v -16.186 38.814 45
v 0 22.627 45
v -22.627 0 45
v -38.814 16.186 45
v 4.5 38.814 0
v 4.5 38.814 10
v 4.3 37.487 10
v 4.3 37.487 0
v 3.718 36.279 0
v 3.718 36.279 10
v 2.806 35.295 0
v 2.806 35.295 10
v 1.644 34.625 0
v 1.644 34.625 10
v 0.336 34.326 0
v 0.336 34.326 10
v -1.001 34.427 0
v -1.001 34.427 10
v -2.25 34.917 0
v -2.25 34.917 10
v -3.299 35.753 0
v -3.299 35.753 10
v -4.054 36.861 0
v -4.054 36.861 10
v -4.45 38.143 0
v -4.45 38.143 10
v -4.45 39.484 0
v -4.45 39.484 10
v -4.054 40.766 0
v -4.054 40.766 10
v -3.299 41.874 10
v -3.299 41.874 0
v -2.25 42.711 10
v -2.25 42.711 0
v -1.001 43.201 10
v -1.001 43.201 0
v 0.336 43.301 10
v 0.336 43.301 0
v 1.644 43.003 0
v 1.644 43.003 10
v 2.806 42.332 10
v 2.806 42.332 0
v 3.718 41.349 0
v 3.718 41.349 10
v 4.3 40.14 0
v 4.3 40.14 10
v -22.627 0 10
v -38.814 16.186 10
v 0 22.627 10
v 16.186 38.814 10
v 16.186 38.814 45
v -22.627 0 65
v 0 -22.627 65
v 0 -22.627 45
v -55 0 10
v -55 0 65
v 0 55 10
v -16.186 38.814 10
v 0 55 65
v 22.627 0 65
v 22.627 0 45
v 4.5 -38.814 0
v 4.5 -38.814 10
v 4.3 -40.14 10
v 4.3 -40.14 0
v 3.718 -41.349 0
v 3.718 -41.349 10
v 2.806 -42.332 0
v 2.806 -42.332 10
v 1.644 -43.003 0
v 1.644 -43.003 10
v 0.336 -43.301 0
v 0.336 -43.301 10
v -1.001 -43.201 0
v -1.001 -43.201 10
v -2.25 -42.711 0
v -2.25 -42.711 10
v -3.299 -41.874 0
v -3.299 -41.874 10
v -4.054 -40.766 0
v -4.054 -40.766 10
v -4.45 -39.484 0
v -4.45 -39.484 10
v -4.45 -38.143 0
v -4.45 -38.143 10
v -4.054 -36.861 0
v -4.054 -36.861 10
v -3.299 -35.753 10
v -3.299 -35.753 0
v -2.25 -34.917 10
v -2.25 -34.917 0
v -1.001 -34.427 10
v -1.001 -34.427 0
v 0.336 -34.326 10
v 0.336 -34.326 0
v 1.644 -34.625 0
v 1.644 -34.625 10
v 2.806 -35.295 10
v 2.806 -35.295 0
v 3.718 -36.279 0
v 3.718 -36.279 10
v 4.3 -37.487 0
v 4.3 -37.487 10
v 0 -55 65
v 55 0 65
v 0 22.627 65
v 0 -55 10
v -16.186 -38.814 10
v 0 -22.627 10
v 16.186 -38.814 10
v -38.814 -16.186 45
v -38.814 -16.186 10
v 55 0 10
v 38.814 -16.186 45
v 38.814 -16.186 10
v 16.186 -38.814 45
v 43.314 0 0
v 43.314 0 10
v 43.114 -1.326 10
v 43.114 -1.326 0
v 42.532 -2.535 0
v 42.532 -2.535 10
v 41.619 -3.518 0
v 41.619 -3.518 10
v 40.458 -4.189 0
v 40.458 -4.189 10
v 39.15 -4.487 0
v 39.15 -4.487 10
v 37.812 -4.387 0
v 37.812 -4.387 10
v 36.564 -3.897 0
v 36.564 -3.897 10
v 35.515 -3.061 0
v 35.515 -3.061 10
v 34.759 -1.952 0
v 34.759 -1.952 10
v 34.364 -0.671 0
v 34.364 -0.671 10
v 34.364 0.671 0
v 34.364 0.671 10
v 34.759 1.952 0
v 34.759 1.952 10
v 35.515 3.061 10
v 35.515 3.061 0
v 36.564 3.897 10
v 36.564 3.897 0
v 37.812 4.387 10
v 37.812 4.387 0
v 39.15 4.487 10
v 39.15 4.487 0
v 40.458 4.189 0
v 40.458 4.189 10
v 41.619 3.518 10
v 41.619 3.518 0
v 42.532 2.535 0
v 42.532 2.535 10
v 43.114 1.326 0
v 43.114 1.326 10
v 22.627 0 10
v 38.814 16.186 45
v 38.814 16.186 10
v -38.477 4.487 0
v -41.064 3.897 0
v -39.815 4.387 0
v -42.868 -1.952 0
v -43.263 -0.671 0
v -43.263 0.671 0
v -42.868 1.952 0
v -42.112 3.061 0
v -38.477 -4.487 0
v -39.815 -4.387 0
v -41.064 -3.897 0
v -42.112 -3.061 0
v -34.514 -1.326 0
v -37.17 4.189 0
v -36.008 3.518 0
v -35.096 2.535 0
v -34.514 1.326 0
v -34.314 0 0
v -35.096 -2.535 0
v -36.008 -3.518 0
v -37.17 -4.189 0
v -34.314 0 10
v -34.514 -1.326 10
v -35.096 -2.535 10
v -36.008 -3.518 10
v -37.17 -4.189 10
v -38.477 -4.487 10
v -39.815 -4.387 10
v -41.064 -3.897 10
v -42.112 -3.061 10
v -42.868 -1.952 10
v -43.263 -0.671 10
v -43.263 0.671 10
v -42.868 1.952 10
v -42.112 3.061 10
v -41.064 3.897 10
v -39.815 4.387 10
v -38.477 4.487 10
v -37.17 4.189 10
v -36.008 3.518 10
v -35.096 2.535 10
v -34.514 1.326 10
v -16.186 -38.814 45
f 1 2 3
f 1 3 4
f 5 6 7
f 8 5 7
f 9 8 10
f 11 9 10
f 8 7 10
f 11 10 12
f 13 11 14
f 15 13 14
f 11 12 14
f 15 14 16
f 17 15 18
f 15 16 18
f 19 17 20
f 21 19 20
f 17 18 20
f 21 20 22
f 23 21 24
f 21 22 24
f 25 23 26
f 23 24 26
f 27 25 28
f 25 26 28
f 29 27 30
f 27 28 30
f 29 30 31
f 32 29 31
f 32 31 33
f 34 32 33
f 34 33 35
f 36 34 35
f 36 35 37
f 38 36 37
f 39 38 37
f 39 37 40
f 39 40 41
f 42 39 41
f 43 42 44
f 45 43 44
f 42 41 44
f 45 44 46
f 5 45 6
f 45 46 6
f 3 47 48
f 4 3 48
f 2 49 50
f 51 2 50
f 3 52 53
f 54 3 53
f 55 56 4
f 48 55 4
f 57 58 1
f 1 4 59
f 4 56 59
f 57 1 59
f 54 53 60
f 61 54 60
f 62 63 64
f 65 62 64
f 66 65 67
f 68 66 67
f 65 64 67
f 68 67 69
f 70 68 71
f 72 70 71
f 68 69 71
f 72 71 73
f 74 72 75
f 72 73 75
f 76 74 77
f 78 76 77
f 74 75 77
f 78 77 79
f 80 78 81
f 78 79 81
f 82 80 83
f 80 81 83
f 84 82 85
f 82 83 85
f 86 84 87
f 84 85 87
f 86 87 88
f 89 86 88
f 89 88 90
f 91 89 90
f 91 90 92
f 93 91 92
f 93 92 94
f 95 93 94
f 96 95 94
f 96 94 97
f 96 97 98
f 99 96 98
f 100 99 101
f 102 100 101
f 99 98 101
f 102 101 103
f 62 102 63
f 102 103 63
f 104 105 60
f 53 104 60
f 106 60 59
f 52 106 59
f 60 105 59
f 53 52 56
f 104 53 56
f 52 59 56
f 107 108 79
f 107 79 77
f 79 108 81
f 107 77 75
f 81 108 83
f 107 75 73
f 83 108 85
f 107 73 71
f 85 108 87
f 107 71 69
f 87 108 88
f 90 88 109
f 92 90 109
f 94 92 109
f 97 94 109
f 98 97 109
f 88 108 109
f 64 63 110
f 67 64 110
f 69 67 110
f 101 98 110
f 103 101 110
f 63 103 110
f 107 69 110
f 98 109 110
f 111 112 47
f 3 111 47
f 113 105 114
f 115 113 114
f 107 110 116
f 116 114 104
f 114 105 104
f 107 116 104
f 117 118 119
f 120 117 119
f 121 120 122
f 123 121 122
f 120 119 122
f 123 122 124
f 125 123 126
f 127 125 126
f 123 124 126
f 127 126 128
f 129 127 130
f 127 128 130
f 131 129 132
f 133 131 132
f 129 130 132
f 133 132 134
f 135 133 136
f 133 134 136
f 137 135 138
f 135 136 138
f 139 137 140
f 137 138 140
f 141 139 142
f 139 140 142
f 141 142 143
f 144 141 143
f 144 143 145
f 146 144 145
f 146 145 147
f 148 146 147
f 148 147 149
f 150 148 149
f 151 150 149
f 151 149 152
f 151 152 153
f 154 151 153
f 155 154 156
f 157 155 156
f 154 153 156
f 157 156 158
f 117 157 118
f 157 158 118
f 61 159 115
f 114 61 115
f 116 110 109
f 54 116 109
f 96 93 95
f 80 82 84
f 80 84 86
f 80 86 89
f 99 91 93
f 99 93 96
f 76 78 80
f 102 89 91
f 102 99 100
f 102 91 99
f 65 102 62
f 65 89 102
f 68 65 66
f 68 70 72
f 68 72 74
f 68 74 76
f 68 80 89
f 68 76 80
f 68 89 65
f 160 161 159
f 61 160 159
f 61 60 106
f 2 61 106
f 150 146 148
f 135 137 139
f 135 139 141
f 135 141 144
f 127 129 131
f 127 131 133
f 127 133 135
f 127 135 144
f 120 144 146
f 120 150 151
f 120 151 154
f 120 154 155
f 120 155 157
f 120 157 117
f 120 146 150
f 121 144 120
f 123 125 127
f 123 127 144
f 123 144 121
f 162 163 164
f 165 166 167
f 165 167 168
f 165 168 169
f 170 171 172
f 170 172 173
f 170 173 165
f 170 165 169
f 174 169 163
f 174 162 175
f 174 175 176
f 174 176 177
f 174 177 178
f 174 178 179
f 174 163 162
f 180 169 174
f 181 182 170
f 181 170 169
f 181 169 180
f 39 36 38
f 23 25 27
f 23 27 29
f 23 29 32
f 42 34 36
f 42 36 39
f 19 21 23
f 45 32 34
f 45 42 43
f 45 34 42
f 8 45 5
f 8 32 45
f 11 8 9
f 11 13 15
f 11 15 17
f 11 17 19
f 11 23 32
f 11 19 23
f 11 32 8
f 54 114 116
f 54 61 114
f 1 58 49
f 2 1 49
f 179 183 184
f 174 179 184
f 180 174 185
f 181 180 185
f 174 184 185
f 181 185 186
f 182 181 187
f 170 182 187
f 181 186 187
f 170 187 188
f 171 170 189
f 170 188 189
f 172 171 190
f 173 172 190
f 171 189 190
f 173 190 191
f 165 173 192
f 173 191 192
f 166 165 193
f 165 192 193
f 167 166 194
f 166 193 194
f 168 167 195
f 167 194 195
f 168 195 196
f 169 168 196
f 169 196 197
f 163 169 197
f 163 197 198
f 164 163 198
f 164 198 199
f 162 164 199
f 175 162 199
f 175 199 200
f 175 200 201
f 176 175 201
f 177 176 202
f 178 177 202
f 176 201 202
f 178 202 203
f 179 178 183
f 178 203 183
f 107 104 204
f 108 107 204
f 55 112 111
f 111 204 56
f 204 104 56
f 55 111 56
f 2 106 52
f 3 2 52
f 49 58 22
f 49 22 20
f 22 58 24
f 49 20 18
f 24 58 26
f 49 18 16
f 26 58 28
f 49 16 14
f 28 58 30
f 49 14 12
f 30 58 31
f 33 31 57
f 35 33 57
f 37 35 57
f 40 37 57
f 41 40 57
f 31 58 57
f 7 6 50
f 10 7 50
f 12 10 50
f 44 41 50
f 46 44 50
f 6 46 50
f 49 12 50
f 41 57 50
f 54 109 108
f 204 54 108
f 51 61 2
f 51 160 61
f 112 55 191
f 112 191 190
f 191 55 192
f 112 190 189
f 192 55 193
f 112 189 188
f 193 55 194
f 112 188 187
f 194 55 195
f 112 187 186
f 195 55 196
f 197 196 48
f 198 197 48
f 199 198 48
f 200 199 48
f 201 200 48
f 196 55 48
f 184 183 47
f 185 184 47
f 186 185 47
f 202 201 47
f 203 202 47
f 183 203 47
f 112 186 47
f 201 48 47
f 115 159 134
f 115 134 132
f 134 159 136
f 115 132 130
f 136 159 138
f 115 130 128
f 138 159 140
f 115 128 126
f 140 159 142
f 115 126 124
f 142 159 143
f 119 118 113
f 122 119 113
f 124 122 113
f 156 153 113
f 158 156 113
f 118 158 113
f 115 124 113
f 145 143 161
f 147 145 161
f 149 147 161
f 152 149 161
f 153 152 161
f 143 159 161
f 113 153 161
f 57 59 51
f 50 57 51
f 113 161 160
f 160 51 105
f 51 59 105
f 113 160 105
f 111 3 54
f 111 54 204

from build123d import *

# Parameters (mm, degrees)
BOSS_EXTRU_1_DEPTH        = 50
BOSS_EXTRU_1_DEPTH_BACK   = 5
BOSS_EXTRU_1_2_DEPTH      = 50
BOSS_EXTRU_1_2_DEPTH_BACK = 5
BOSS_EXTRU_1_3_DEPTH      = 50
BOSS_EXTRU_1_3_DEPTH_BACK = 5
BOSS_EXTRU_1_4_DEPTH      = 50
BOSS_EXTRU_1_4_DEPTH_BACK = 5
BOSS_EXTRU_2_DEPTH        = 20
ESQUISSE4_R               = 4.5
BOSS_EXTRU_3_DEPTH        = 10


with BuildPart() as part:
    # Esquisse1 → Boss.-Extru.1 (new, two sides: drawn at the far end of the back side and taken through both)
    with BuildSketch(Plane.XY.offset(15).offset(-BOSS_EXTRU_1_DEPTH_BACK)):
        Polygon((0, 55), (-16.186291501, 38.813708499), (0, 22.627416998), (16.186291501, 38.813708499), align=None)
    extrude(amount=BOSS_EXTRU_1_DEPTH + BOSS_EXTRU_1_DEPTH_BACK)



with BuildPart() as body_2:
    # Esquisse1 → Boss.-Extru.1 2 (new, two sides: drawn at the far end of the back side and taken through both)
    with BuildSketch(Plane.XY.offset(15).offset(-BOSS_EXTRU_1_2_DEPTH_BACK)):
        Polygon((-38.813708499, 16.186291501), (-55, 0), (-38.813708499, -16.186291501), (-22.627416998, 0), align=None)
    extrude(amount=BOSS_EXTRU_1_2_DEPTH + BOSS_EXTRU_1_2_DEPTH_BACK)


with BuildPart() as body_3:
    # Esquisse1 → Boss.-Extru.1 3 (new, two sides: drawn at the far end of the back side and taken through both)
    with BuildSketch(Plane.XY.offset(15).offset(-BOSS_EXTRU_1_3_DEPTH_BACK)):
        Polygon((-16.186291501, -38.813708499), (0, -55), (16.186291501, -38.813708499), (0, -22.627416998), align=None)
    extrude(amount=BOSS_EXTRU_1_3_DEPTH + BOSS_EXTRU_1_3_DEPTH_BACK)


with BuildPart() as body_4:
    # Esquisse1 → Boss.-Extru.1 4 (new, two sides: drawn at the far end of the back side and taken through both)
    with BuildSketch(Plane.XY.offset(15).offset(-BOSS_EXTRU_1_4_DEPTH_BACK)):
        Polygon((38.813708499, -16.186291501), (55, 0), (38.813708499, 16.186291501), (22.627416998, 0), align=None)
    extrude(amount=BOSS_EXTRU_1_4_DEPTH + BOSS_EXTRU_1_4_DEPTH_BACK)


with BuildPart() as part_1:
    add(part.part)

    add(body_2.part)  # Boss.-Extru.2 merges body 2

    add(body_3.part)  # Boss.-Extru.2 merges body 3

    add(body_4.part)  # Boss.-Extru.2 merges body 4
    # Esquisse3 → Boss.-Extru.2 (add)
    with BuildSketch(Plane.XY.offset(65)):
        Polygon((22.627416998, 0), (0, 22.627416998), (16.186291501, 38.813708499), (38.813708499, 16.186291501), align=None)
        Polygon((-38.813708499, 16.186291501), (-16.186291501, 38.813708499), (0, 22.627416998), (-22.627416998, 0), align=None)
        Polygon((38.813708499, -16.186291501), (16.186291501, -38.813708499), (0, -22.627416998), (22.627416998, 0), align=None)
        Polygon((-38.813708499, -16.186291501), (-22.627416998, 0), (0, -22.627416998), (-16.186291501, -38.813708499), align=None)
    extrude(amount=-BOSS_EXTRU_2_DEPTH)

    # Esquisse4 → Boss.-Extru.3 (add)
    with BuildSketch(Plane(origin=(0, 0, 10), x_dir=(-1, 0, 0), z_dir=(0, 0, -1))):
        with Locations(Location((0, -38.813708499, 0), (0, 0, 180))):
            Circle(ESQUISSE4_R)
        with Locations(Location((-38.813708499, 0, 0), (0, 0, 180))):
            Circle(ESQUISSE4_R)
        with Locations(Location((0, 38.813708499, 0), (0, 0, 180))):
            Circle(ESQUISSE4_R)
        with Locations(Location((38.813708499, 0, 0), (0, 0, 180))):
            Circle(ESQUISSE4_R)
    extrude(amount=BOSS_EXTRU_3_DEPTH)


solid = part_1.part
